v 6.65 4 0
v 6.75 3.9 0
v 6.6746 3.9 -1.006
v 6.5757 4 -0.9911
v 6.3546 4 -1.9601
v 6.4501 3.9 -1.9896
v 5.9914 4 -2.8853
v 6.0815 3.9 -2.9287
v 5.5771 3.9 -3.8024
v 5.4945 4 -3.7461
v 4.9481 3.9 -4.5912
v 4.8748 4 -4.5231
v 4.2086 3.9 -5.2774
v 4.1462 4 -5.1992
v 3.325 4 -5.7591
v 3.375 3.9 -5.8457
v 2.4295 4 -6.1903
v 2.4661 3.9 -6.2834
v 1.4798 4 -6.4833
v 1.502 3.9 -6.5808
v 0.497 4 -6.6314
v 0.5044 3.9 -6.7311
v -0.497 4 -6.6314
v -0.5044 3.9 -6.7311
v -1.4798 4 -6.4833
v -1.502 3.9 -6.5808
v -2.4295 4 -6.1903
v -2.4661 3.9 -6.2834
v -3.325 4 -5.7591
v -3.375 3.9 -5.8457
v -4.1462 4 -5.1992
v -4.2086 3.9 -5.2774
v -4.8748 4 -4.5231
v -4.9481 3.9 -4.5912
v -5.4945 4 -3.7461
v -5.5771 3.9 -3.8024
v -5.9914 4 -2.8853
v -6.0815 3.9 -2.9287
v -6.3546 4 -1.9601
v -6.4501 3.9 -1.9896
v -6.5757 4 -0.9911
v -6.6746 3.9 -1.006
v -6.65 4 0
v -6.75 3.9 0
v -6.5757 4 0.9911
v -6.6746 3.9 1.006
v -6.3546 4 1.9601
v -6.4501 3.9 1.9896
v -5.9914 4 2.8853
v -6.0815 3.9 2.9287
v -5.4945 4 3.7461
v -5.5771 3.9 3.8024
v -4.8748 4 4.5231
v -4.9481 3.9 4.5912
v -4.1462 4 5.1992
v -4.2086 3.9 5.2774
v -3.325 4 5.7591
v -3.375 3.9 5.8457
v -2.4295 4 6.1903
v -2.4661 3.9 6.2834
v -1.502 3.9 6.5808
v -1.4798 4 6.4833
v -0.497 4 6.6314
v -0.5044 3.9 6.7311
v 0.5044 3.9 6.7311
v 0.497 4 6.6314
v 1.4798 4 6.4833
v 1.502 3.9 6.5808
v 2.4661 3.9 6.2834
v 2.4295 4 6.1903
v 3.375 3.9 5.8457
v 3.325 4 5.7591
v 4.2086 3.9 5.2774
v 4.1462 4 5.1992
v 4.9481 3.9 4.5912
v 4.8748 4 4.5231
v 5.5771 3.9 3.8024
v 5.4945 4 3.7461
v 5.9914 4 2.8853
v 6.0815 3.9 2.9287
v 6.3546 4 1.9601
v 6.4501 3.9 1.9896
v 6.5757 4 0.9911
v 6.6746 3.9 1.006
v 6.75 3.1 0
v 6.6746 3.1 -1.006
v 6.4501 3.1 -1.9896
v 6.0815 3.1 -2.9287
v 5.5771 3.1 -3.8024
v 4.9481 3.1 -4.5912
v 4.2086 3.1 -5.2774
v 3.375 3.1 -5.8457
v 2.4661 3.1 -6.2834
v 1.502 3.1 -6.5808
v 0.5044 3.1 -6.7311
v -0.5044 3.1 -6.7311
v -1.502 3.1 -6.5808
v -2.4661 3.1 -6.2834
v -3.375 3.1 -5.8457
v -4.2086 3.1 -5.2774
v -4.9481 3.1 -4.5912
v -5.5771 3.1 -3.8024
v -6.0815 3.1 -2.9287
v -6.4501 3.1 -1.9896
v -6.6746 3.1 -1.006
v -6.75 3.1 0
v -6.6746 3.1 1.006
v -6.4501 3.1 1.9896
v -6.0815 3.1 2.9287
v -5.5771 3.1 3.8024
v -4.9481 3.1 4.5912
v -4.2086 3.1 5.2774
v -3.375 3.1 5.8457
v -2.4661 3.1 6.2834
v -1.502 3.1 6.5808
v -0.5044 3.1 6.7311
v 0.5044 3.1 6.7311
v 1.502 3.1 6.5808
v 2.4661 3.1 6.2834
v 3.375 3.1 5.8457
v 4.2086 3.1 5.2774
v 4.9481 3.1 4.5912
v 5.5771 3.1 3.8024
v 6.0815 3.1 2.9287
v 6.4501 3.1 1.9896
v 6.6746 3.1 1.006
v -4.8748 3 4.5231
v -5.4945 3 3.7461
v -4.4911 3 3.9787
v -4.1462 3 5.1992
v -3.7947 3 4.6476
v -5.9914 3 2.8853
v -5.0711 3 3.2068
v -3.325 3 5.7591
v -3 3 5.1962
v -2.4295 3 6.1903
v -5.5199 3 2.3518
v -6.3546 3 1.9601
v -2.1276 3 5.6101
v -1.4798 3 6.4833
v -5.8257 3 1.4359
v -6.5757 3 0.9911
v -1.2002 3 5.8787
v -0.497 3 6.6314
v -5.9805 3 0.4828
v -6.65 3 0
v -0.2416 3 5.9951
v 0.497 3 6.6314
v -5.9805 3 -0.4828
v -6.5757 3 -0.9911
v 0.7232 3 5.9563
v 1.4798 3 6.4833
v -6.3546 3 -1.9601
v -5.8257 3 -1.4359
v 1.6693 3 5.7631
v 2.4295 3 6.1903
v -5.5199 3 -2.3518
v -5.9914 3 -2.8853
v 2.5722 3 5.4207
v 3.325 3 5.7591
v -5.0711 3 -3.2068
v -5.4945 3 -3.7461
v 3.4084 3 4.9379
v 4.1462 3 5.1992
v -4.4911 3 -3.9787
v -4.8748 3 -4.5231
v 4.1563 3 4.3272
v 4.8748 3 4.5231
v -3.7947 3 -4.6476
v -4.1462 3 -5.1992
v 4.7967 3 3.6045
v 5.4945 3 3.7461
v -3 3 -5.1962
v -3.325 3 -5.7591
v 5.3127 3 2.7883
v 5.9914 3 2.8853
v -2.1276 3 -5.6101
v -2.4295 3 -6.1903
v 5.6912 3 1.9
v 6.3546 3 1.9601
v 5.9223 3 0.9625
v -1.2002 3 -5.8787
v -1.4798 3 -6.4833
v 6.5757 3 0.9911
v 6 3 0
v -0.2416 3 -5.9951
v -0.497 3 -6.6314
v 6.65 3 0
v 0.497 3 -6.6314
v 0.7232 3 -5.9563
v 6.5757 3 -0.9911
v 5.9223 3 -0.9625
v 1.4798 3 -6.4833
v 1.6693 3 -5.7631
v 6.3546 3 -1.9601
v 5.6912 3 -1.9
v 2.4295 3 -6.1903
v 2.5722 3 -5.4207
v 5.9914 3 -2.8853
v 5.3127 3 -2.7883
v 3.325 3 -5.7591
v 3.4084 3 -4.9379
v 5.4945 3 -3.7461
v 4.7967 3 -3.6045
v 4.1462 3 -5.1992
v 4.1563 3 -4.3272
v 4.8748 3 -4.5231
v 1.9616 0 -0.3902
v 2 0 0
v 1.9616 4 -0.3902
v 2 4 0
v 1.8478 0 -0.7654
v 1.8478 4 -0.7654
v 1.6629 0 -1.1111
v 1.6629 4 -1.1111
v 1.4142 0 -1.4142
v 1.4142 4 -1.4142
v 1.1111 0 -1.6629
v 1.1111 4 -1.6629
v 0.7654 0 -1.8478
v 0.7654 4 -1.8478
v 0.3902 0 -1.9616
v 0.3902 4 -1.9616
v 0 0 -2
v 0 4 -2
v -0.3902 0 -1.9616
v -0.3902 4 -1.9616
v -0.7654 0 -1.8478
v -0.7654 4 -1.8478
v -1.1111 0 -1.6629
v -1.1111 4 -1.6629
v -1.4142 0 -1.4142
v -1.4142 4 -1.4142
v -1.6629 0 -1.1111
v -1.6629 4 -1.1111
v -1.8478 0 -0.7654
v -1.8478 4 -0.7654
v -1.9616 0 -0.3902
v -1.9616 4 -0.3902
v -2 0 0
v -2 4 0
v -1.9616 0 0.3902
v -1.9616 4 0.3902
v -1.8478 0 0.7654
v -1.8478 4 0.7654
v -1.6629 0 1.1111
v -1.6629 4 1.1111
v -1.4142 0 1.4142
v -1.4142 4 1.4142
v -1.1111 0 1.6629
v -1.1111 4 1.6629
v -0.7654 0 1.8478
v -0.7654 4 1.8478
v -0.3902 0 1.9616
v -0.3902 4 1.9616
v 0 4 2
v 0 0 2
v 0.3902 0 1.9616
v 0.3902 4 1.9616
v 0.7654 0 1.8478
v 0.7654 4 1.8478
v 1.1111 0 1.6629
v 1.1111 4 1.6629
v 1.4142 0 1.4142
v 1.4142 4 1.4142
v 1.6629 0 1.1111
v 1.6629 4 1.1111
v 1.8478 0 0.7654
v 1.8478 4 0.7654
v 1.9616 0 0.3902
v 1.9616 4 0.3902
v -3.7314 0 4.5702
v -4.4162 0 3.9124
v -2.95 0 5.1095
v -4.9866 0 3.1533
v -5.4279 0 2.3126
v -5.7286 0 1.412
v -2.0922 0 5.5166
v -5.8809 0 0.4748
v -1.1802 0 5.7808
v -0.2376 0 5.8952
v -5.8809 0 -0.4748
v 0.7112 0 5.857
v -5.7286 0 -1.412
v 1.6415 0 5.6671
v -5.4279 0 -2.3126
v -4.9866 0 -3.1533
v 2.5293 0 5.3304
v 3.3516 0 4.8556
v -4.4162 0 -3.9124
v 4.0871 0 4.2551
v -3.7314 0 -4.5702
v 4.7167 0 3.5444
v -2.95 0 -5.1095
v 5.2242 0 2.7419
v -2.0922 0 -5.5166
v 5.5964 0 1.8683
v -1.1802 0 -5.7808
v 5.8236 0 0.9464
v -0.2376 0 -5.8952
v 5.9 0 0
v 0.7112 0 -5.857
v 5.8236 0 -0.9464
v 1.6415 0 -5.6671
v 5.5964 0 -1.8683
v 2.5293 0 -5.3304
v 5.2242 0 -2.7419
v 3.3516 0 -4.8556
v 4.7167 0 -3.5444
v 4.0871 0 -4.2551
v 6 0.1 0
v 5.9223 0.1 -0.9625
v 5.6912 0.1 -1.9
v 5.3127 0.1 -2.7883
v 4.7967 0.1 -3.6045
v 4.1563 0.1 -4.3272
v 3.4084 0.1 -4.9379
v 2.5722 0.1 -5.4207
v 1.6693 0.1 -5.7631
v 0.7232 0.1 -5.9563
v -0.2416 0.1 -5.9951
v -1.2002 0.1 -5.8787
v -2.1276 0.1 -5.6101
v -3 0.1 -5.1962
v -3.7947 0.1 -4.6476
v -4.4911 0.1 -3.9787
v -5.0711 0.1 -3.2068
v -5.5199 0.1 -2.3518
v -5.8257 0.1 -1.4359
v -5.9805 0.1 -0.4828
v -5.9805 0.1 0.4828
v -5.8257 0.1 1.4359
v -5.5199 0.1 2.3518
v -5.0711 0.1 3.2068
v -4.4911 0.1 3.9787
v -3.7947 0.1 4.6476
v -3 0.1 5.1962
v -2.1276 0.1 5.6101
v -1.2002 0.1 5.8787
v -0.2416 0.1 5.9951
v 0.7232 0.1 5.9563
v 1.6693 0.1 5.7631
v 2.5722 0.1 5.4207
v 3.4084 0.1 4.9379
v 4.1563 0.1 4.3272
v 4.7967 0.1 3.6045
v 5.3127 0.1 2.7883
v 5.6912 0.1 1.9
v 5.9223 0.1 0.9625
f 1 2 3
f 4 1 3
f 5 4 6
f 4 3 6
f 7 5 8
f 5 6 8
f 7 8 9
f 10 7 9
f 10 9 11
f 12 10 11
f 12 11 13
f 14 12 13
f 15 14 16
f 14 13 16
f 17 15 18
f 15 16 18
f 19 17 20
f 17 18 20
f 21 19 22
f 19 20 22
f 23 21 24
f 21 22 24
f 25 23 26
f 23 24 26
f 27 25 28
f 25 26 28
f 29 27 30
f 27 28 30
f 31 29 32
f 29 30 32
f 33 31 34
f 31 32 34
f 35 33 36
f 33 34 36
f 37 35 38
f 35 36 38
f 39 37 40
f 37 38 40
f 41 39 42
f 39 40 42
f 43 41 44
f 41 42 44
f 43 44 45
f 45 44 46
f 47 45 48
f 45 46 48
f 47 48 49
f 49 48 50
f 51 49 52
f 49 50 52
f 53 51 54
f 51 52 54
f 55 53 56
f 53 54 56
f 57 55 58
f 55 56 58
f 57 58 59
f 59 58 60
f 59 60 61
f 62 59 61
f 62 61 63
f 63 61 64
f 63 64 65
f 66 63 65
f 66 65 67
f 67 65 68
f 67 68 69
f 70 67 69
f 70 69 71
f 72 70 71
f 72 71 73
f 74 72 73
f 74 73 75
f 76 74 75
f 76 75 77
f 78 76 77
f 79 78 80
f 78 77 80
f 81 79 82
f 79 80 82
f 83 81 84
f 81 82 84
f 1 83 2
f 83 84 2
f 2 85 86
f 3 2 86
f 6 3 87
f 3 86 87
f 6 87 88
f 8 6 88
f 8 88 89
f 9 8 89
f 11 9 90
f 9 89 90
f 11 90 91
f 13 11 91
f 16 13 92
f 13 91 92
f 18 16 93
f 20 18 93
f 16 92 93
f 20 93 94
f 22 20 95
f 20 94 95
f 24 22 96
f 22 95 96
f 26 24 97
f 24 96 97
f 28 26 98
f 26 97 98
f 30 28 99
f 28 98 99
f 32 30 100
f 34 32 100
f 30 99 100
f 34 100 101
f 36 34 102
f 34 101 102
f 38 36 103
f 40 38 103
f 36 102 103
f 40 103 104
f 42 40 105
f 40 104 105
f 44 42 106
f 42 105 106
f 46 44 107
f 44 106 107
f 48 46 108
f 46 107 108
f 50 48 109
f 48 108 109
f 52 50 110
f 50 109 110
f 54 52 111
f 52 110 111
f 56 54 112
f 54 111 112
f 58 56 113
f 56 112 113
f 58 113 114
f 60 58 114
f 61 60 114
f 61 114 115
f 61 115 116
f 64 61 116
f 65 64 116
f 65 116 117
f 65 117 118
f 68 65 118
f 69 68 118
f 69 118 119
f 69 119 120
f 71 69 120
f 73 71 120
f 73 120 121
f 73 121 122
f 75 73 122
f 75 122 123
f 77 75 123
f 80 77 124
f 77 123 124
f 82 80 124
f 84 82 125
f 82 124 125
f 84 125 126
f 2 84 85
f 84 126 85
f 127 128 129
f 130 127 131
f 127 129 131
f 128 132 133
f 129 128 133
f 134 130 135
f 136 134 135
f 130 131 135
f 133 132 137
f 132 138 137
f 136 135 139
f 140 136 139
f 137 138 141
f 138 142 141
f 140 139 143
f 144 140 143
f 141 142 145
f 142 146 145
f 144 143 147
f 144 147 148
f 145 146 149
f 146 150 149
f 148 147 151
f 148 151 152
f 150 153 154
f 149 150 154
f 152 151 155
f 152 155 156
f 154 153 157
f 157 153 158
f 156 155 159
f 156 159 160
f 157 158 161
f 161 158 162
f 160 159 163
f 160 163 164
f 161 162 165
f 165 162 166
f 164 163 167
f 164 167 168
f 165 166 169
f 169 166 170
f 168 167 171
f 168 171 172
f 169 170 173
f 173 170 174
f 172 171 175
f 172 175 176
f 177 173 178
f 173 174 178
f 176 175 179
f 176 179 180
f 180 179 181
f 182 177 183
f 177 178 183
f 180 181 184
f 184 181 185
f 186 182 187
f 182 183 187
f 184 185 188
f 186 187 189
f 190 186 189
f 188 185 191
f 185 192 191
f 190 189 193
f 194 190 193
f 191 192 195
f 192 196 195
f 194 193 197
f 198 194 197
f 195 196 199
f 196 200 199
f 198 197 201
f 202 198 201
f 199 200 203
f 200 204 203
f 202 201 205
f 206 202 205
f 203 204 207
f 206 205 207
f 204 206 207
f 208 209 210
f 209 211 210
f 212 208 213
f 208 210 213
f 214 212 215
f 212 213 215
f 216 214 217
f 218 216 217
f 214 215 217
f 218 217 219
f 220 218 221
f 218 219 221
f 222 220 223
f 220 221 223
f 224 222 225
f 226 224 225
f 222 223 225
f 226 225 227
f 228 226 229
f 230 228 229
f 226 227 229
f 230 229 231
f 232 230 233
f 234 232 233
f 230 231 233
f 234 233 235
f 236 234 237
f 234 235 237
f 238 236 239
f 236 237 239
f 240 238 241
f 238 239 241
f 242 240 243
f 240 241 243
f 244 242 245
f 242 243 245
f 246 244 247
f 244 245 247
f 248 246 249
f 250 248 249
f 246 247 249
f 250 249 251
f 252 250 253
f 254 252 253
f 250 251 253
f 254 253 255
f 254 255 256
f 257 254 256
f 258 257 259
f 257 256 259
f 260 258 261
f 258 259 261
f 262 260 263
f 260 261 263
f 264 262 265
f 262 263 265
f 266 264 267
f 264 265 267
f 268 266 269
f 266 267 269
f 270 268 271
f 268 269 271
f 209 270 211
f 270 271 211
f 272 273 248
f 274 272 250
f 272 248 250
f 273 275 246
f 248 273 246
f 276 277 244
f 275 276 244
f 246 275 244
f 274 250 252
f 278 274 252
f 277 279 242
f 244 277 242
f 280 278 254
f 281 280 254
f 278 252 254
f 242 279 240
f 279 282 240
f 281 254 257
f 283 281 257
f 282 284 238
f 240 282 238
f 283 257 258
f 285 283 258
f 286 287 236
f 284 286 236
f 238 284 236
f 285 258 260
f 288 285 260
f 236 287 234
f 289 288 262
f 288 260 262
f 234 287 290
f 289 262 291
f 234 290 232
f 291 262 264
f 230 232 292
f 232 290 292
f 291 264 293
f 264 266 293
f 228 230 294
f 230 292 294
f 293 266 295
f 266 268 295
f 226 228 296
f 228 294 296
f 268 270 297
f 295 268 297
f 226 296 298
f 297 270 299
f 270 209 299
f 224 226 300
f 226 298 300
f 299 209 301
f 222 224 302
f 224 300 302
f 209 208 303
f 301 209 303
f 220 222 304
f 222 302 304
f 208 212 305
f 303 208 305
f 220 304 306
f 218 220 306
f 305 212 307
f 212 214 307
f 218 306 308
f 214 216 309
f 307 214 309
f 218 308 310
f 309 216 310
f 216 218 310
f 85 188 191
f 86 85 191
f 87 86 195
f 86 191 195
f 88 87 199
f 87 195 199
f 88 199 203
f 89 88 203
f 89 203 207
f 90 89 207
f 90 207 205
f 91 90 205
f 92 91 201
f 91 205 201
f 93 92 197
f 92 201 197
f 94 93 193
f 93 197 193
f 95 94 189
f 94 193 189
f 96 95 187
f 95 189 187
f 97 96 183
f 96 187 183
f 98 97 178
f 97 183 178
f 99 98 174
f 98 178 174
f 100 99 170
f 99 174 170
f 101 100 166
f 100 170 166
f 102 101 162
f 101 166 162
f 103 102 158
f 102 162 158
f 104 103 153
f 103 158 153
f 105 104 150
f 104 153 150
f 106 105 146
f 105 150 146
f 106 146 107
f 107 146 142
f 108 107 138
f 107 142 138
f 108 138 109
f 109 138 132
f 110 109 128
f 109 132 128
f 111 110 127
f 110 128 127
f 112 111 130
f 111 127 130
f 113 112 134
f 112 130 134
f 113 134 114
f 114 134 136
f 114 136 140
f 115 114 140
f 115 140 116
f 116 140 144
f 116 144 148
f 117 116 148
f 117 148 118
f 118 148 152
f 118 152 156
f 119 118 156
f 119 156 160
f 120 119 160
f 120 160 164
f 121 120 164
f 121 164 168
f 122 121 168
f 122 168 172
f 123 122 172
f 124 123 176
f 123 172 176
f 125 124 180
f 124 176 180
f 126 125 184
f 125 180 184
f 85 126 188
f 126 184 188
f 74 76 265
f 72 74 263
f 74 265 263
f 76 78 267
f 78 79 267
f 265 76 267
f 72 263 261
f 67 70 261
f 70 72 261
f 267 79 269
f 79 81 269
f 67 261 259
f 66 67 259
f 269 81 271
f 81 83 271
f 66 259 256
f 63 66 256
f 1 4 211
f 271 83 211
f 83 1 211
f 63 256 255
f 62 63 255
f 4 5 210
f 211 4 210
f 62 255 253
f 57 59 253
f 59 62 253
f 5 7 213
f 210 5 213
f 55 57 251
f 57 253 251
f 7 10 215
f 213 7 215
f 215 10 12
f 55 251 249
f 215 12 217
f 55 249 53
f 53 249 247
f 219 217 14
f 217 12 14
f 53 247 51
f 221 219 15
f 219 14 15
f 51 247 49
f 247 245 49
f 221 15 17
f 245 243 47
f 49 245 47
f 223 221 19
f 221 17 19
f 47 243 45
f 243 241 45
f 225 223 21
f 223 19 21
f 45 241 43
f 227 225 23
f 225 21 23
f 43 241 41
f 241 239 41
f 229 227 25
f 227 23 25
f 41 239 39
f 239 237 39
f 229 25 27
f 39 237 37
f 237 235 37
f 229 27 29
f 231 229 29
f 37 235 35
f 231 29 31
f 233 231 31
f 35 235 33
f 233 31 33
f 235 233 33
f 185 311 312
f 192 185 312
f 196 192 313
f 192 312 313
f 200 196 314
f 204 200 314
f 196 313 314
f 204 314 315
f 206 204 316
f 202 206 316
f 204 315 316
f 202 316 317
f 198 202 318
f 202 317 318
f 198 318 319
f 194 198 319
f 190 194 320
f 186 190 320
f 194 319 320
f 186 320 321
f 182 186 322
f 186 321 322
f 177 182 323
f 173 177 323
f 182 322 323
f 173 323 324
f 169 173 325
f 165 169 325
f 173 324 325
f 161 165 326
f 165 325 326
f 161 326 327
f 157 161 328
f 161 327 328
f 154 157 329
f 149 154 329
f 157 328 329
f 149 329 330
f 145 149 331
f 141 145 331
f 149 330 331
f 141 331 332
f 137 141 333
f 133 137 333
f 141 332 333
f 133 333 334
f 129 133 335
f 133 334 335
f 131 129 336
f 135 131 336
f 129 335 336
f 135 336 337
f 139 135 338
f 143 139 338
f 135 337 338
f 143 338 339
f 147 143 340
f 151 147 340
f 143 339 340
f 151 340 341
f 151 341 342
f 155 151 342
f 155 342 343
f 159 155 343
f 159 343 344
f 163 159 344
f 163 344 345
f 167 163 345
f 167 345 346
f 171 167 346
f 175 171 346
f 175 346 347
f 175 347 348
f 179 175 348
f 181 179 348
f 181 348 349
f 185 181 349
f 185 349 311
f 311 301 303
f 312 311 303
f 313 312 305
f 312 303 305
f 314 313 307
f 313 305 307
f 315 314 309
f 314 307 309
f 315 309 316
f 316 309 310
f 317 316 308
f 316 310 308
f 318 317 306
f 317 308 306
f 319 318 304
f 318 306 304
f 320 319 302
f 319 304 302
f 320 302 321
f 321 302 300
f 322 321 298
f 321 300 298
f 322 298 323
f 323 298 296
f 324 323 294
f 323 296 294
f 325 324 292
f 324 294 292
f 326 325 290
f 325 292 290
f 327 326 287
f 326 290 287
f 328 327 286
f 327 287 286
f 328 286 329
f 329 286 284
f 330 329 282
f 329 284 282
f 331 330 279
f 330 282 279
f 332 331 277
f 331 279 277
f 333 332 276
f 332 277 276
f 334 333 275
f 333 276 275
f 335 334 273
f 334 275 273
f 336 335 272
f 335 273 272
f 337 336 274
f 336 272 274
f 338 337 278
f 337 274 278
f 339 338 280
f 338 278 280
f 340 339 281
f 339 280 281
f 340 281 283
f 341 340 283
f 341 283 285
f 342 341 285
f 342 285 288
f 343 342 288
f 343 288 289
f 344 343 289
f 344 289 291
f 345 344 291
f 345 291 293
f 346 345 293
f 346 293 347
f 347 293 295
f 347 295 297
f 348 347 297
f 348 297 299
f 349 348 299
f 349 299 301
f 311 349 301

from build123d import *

# Parameters (mm, degrees)
CHAMFER_1_SIZE = 0.1


with BuildPart() as part:
    # 草图1 → 旋转1 (revolve)
    with BuildSketch(Plane.XY):
        Polygon((2, 0), (2, 4), (6.75, 4), (6.75, 3), (6, 3), (6, 0), align=None)
    revolve(axis=Axis((0, 0, 0), (0, 1, 0)))

    # 倒角1
    chamfer_1_edges = [part.edges().sort_by_distance(p)[0] for p in [
        (-6, 0, 0),
        (-6.75, 3, 0),
        (-6.75, 4, 0),
    ]]
    chamfer(chamfer_1_edges, length=CHAMFER_1_SIZE)


solid = part.part
